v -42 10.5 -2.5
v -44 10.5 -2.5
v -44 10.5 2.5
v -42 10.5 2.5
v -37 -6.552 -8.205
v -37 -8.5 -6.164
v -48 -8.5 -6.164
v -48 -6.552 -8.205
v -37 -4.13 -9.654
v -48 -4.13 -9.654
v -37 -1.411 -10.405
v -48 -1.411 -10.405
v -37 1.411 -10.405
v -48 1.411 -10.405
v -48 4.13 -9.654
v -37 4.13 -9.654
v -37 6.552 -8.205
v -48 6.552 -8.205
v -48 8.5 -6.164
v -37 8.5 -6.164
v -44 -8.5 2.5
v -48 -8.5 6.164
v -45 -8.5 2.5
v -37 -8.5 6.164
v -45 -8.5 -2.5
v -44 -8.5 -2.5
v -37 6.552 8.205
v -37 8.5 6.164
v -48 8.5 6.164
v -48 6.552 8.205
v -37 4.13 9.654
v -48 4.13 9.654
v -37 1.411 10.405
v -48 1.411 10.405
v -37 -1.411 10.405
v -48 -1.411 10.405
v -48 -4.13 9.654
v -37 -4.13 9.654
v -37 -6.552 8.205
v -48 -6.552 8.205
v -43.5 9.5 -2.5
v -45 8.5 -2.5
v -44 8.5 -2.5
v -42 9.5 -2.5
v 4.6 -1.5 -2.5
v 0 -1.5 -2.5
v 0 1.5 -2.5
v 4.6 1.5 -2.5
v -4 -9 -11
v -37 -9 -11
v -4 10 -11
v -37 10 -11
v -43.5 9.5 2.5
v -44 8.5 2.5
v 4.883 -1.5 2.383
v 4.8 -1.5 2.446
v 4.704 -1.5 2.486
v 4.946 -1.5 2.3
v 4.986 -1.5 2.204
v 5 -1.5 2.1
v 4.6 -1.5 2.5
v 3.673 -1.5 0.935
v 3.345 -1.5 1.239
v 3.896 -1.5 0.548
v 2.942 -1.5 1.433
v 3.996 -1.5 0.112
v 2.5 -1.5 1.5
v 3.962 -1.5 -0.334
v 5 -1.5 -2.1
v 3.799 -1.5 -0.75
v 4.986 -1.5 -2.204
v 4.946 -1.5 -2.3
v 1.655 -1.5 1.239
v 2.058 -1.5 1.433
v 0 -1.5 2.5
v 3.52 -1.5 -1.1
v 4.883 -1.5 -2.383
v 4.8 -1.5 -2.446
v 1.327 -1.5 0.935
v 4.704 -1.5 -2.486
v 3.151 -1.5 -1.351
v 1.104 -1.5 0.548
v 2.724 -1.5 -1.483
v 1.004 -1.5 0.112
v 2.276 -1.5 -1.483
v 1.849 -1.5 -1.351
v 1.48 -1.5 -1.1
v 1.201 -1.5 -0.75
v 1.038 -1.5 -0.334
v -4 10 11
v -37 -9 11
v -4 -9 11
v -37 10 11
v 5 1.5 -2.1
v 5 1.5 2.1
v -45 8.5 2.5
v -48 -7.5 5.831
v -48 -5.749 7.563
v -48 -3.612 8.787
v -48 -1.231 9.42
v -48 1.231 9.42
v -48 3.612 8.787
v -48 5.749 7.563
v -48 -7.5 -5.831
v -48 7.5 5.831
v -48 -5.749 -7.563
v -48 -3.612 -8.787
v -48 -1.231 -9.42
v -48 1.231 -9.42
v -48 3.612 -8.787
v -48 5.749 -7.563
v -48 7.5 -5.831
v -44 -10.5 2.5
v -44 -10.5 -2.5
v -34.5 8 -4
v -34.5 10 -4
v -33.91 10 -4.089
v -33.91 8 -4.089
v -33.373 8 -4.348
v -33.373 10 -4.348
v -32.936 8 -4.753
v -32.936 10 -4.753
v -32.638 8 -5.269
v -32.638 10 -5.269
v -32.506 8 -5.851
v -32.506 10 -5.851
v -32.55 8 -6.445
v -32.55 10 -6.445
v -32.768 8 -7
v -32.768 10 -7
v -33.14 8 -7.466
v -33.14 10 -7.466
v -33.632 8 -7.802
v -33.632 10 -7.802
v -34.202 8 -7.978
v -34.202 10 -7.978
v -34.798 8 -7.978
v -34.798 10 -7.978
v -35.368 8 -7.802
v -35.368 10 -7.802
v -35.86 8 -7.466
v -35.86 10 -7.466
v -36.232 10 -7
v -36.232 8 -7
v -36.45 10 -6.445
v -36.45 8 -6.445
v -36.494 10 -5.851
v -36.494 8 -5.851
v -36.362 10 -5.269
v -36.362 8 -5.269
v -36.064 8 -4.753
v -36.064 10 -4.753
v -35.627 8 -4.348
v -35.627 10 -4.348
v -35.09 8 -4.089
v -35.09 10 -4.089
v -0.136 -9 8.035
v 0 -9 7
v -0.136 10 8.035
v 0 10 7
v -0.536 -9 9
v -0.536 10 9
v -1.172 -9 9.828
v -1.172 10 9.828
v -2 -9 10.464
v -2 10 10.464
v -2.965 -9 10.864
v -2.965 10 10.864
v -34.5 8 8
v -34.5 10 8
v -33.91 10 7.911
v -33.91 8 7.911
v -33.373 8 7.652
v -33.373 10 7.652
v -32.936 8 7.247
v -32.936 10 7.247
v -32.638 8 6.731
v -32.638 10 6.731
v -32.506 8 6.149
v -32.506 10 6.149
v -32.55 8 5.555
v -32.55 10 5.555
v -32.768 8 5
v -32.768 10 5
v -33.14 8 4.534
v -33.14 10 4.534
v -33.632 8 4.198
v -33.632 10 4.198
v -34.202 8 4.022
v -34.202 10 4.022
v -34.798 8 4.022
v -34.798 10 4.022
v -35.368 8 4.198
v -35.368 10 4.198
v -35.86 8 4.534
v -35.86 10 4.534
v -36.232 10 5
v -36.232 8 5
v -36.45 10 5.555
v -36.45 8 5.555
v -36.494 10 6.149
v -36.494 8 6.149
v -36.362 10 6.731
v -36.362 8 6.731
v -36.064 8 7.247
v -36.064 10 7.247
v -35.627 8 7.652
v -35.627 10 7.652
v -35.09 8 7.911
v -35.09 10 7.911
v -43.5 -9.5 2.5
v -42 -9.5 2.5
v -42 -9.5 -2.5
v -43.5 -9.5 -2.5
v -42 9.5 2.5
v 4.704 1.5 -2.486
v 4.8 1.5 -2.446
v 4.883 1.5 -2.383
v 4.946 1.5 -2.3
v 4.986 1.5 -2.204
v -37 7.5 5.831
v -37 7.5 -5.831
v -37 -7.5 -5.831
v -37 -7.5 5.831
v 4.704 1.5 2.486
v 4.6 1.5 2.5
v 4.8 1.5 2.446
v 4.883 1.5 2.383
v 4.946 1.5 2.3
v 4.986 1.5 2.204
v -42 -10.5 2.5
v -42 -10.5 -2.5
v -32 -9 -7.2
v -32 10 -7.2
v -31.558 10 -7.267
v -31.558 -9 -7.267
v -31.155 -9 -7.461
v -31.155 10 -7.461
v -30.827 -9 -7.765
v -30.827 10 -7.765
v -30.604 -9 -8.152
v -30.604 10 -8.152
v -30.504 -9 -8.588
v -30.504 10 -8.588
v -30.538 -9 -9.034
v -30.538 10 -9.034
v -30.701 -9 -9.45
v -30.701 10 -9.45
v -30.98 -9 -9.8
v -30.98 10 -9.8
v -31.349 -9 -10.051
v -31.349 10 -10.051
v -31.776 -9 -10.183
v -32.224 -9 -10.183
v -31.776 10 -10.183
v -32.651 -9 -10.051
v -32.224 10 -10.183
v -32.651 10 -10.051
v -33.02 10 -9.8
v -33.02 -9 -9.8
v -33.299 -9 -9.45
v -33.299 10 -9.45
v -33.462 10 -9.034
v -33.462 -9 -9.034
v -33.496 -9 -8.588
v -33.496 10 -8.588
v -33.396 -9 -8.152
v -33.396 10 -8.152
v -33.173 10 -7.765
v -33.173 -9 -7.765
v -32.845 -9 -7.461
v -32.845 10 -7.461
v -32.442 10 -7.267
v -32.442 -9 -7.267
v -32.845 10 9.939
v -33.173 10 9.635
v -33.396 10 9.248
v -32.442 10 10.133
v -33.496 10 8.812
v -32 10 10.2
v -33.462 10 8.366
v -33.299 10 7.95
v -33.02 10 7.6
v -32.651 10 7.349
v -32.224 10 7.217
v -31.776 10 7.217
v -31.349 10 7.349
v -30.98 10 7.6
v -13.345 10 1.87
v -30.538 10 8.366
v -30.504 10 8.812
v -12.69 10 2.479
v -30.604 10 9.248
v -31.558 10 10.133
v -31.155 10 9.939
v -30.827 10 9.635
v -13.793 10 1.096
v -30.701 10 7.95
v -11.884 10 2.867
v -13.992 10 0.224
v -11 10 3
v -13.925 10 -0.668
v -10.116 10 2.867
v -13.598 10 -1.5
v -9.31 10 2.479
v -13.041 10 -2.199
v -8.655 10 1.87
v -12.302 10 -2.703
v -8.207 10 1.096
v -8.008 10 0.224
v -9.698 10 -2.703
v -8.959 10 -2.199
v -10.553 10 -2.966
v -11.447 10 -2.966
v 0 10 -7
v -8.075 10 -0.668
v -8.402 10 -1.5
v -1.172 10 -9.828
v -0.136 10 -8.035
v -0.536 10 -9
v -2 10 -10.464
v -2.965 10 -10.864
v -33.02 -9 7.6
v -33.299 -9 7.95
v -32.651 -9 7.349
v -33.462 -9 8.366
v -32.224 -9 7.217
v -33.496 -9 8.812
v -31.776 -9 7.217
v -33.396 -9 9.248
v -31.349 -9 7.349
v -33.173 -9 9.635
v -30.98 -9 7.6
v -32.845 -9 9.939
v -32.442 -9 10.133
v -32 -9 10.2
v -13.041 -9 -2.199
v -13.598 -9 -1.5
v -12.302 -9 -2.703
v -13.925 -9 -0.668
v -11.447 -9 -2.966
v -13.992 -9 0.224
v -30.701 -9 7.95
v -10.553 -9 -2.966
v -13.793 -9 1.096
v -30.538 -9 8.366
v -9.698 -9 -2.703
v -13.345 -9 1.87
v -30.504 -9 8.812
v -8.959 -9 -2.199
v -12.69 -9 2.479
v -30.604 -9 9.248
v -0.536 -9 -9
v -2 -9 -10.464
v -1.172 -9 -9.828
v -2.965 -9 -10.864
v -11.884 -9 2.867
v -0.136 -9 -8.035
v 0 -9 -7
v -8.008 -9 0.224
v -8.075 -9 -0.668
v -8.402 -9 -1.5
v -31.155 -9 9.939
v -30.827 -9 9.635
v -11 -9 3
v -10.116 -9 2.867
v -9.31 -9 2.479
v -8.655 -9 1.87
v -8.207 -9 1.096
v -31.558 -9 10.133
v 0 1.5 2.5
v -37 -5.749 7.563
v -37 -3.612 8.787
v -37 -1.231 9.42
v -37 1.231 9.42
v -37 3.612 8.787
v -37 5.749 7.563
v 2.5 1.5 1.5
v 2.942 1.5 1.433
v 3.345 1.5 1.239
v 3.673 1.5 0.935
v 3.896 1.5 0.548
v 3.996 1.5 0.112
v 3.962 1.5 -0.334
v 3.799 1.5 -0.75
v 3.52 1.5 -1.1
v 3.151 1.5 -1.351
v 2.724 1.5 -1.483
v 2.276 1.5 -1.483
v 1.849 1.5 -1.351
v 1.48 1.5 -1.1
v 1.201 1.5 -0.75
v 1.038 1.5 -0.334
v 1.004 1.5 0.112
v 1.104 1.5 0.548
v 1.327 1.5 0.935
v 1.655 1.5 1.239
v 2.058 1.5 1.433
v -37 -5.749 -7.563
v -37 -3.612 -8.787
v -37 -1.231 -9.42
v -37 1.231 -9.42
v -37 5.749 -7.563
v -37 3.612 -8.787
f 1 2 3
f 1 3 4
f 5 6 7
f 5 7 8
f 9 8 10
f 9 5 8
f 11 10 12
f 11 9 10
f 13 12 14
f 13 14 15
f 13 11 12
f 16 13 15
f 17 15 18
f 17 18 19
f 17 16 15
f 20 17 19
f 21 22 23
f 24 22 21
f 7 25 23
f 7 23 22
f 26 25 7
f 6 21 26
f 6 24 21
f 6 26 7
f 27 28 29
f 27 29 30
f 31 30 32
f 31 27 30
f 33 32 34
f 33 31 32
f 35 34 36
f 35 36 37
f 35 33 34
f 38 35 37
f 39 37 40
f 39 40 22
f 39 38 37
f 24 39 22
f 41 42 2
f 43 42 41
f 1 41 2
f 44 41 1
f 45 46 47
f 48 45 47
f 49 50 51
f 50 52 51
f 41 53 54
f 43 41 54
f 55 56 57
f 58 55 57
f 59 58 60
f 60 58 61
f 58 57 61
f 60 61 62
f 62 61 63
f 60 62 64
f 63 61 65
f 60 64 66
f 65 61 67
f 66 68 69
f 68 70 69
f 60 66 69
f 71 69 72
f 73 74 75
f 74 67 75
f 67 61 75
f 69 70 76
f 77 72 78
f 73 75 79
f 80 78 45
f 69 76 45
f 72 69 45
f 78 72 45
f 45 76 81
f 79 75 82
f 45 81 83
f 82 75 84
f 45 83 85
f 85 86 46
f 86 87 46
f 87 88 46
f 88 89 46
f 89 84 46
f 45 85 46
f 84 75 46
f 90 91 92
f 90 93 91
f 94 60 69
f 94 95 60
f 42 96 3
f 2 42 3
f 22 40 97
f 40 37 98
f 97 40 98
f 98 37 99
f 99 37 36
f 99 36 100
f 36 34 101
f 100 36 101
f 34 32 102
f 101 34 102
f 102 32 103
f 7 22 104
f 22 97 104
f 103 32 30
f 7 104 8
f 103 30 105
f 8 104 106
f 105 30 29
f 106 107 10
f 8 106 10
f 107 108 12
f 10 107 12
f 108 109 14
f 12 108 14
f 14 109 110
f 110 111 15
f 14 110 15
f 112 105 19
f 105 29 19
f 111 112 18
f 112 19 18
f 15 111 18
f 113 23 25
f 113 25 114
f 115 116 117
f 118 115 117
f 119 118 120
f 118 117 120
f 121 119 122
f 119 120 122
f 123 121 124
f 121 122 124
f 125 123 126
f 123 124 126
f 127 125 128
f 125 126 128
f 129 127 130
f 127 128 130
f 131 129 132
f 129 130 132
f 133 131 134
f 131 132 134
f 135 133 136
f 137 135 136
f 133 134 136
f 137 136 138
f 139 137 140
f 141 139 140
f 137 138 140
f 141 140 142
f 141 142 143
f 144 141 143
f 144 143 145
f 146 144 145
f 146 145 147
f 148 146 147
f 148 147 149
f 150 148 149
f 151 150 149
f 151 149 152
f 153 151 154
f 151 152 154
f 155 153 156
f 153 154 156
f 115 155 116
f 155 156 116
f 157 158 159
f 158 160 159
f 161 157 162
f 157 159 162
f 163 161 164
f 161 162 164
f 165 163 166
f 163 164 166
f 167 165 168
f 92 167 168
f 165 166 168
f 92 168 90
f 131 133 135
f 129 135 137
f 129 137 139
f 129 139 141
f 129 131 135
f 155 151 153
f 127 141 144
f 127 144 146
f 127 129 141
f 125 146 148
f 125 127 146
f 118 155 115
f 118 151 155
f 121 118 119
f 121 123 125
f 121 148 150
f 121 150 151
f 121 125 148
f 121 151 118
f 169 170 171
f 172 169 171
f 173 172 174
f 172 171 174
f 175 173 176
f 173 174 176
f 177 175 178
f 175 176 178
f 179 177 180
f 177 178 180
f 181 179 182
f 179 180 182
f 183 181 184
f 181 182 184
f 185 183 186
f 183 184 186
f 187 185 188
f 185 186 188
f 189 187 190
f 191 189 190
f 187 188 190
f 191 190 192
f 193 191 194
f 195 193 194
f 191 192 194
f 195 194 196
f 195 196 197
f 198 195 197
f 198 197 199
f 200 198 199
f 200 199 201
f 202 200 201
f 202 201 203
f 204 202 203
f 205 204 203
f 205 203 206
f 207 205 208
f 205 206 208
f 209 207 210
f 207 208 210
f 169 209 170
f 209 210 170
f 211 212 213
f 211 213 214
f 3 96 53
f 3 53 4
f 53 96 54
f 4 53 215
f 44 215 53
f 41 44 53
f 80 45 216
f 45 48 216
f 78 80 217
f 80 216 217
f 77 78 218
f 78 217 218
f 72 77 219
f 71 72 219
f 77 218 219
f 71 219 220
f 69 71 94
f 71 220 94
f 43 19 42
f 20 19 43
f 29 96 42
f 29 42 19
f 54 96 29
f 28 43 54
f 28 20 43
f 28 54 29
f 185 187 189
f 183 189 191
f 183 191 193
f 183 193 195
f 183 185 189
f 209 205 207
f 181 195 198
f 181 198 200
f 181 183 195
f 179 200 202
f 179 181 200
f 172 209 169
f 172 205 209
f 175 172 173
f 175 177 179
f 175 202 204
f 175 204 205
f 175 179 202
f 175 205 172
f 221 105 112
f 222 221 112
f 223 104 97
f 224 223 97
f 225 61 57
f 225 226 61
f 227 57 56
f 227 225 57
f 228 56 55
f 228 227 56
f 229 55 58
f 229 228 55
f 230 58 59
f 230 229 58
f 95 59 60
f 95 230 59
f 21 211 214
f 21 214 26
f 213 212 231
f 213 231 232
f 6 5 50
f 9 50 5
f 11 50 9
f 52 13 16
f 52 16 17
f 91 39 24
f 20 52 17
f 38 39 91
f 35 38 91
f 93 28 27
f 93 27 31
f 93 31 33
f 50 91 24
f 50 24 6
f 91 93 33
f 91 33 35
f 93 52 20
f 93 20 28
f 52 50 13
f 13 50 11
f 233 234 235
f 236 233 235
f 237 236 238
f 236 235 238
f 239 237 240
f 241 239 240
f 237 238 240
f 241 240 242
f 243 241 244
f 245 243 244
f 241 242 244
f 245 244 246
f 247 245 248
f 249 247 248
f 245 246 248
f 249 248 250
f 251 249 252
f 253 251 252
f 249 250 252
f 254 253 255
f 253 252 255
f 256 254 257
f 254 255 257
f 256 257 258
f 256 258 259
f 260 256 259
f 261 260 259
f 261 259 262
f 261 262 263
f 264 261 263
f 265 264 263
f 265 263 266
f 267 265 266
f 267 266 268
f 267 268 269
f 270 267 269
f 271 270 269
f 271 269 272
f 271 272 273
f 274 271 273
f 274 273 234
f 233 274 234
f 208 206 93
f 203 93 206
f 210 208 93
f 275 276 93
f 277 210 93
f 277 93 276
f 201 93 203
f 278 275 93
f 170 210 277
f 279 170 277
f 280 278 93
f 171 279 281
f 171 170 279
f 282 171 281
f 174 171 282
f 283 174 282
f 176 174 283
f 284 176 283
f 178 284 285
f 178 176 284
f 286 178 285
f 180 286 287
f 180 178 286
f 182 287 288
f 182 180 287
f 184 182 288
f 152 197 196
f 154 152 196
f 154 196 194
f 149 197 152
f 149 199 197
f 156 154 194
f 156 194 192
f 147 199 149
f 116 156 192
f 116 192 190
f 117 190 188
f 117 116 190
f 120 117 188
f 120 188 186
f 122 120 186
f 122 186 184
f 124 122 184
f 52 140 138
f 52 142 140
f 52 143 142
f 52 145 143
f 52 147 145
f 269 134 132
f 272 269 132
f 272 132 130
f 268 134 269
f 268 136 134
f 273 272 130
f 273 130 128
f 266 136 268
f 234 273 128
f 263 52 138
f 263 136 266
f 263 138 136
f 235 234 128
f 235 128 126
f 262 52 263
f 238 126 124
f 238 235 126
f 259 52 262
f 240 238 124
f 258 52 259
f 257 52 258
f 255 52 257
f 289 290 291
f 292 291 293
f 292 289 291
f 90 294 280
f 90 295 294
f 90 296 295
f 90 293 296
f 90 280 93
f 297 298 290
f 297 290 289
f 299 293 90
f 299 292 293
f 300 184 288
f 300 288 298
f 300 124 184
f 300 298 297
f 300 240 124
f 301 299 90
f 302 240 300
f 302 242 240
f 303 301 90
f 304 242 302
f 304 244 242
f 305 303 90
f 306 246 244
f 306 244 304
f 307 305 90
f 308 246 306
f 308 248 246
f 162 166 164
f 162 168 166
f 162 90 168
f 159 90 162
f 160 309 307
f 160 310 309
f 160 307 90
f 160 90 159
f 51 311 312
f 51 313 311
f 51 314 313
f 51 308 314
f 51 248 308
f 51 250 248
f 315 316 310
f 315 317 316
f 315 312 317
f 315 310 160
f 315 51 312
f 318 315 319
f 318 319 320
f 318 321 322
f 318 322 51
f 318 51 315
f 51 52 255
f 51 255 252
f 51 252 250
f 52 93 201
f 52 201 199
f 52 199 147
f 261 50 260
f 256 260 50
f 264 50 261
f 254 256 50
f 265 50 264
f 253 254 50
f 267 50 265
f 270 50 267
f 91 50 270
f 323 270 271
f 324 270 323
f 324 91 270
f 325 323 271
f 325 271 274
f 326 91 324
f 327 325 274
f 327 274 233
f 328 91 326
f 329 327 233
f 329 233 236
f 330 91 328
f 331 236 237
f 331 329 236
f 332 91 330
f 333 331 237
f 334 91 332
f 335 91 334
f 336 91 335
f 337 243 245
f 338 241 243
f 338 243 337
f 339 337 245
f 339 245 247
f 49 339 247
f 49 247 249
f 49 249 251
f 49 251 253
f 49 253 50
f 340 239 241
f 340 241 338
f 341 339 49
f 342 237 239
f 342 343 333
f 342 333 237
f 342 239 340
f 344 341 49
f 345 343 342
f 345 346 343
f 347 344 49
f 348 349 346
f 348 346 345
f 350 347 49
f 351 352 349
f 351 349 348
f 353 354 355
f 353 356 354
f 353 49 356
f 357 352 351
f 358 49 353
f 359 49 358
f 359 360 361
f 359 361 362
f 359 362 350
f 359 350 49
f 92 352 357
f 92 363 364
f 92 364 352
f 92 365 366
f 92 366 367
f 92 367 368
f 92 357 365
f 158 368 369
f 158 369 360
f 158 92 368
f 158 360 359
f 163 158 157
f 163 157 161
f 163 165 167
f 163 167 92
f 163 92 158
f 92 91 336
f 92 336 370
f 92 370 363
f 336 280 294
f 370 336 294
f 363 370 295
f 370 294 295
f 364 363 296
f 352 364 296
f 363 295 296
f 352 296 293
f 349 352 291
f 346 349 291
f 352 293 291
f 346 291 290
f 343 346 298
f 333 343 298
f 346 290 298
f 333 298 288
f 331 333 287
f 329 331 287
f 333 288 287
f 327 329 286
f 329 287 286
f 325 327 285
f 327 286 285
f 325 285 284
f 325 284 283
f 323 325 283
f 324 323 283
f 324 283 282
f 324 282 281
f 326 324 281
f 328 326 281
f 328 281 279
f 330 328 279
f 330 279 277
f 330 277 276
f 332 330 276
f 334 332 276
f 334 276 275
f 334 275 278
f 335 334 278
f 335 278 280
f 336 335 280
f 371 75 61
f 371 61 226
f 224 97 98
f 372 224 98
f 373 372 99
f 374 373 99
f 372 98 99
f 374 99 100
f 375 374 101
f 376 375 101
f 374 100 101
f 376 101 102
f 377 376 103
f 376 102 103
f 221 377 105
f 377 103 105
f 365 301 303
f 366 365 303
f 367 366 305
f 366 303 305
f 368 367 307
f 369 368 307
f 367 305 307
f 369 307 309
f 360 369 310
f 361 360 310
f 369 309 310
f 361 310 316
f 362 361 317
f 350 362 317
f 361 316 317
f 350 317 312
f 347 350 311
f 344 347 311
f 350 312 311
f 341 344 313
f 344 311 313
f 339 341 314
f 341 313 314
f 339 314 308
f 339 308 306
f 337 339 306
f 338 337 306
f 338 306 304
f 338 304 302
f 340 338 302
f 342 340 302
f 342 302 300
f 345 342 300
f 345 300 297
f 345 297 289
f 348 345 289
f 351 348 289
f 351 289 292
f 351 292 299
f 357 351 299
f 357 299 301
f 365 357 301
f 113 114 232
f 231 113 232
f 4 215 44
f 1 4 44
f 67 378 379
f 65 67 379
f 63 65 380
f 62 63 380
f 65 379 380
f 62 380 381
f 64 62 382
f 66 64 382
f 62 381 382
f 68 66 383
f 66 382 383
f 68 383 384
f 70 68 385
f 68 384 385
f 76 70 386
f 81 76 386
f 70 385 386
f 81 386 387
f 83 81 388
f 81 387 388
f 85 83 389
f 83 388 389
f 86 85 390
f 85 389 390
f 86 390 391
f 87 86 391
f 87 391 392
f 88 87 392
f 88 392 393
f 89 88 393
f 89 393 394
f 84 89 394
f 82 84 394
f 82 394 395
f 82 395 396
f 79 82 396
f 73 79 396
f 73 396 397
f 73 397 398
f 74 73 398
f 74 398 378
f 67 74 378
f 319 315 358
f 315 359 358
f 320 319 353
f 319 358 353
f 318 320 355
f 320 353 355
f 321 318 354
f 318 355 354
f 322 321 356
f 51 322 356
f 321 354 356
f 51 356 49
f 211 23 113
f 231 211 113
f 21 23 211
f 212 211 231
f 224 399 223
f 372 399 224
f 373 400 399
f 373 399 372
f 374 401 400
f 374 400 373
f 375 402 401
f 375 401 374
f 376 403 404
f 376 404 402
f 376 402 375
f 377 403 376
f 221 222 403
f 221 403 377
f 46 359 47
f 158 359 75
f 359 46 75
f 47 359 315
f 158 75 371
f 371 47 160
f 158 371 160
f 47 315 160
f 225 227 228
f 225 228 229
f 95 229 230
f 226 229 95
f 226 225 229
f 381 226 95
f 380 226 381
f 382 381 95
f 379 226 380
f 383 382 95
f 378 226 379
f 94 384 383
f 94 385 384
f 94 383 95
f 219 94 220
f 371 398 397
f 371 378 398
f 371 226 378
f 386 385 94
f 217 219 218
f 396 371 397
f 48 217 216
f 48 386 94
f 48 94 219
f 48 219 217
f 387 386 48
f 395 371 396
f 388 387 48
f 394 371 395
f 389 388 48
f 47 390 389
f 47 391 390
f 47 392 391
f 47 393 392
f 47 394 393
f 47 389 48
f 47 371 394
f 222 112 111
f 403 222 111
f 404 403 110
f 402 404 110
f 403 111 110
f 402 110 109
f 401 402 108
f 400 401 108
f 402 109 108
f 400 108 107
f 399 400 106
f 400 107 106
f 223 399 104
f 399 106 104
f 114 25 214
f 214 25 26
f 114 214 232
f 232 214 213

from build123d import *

# Parameters (mm, degrees)
SKETCH1_W           = 37
SKETCH1_H           = 22
BOSS_EXTRUDE1_DEPTH = 10
SKETCH3_W           = 37
SKETCH3_H           = 22
BOSS_EXTRUDE2_DEPTH = 9
SKETCH5_W           = 5
SKETCH5_H           = 3
BOSS_EXTRUDE3_DEPTH = 5
SKETCH6_R           = 1.5
CUT_EXTRUDE1_DEPTH  = 5
FILLET1_R           = 0.4
FILLET2_R           = 4
SKETCH7_R           = 3
CUT_EXTRUDE2_DEPTH  = 44.023249529
SKETCH8_R           = 1.5
CUT_EXTRUDE4_DEPTH  = 44.023249529
SKETCH10_R          = 2
CUT_EXTRUDE5_DEPTH  = 2
BOSS_EXTRUDE4_DEPTH = 11
CUT_EXTRUDE6_DEPTH  = 11
SKETCH13_W          = 3
SKETCH13_H          = 5
BOSS_EXTRUDE5_DEPTH = 2
CUT_EXTRUDE7_DEPTH  = 51.955863254


with BuildPart() as part:
    # Sketch1 → Boss-Extrude1 (new body)
    with BuildSketch(Plane(origin=(0, 0, 0), x_dir=(1, 0, 0), z_dir=(0, 1, 0))):
        with Locations((-18.5, 0)):
            Rectangle(SKETCH1_W, SKETCH1_H)
    extrude(amount=BOSS_EXTRUDE1_DEPTH)

    # Sketch3 → Boss-Extrude2 (add)
    with BuildSketch(Plane.XZ):
        with Locations((-18.5, 0)):
            Rectangle(SKETCH3_W, SKETCH3_H)
    extrude(amount=BOSS_EXTRUDE2_DEPTH)

    # Sketch5 → Boss-Extrude3 (add)
    with BuildSketch(Plane(origin=(0, 0, 0), x_dir=(0, 0, -1), z_dir=(1, 0, 0))):
        Rectangle(SKETCH5_W, SKETCH5_H)
    extrude(amount=BOSS_EXTRUDE3_DEPTH)

    # Sketch6 → Cut-Extrude1 (cut)
    with BuildSketch(Plane(origin=(0, 1.5, 0), x_dir=(1, 0, 0), z_dir=(0, 1, 0))):
        with Locations(Location((2.5, 0, 0), (0, 0, 270))):
            Circle(SKETCH6_R)
    extrude(amount=-CUT_EXTRUDE1_DEPTH, mode=Mode.SUBTRACT)

    # Fillet1
    fillet1_edges = [part.edges().sort_by_distance(p)[0] for p in [
        (5, 0, -2.5),
        (5, 0, 2.5),
    ]]
    fillet(fillet1_edges, radius=FILLET1_R)

    # Fillet2
    fillet2_edges = [part.edges().sort_by_distance(p)[0] for p in [
        (0, 0.5, 11),
        (0, 0.5, -11),
    ]]
    fillet(fillet2_edges, radius=FILLET2_R)

    # Sketch7 → Cut-Extrude2 (cut, through all)
    with BuildSketch(Plane(origin=(0, 10, 0), x_dir=(1, 0, 0), z_dir=(0, 1, 0))):
        with Locations(Location((-11, 0, 0), (0, 0, 270))):
            Circle(SKETCH7_R)
    extrude(amount=-CUT_EXTRUDE2_DEPTH, mode=Mode.SUBTRACT)

    # Sketch8 → Cut-Extrude4 (cut, through all)
    with BuildSketch(Plane(origin=(0, 10, 0), x_dir=(1, 0, 0), z_dir=(0, 1, 0))):
        with Locations(Location((-32, 8.7, 0), (0, 0, 270))):
            Circle(SKETCH8_R)
        with Locations(Location((-32, -8.7, 0), (0, 0, 270))):
            Circle(SKETCH8_R)
    extrude(amount=-CUT_EXTRUDE4_DEPTH, mode=Mode.SUBTRACT)

    # Sketch10 → Cut-Extrude5 (cut)
    with BuildSketch(Plane(origin=(0, 10, 0), x_dir=(1, 0, 0), z_dir=(0, 1, 0))):
        with Locations(Location((-34.5, 6, 0), (0, 0, 270))):
            Circle(SKETCH10_R)
        with Locations(Location((-34.5, -6, 0), (0, 0, 270))):
            Circle(SKETCH10_R)
    extrude(amount=-CUT_EXTRUDE5_DEPTH, mode=Mode.SUBTRACT)

    # Sketch11 → Boss-Extrude4 (add)
    with BuildSketch(Plane.ZY.offset(37)):
        with BuildLine():
            Line((-6.164414003, 8.5), (6.164414003, 8.5))
            ThreePointArc((6.164414003, 8.5), (10.5, 0), (6.164414003, -8.5))
            Line((6.164414003, -8.5), (-6.164414003, -8.5))
            ThreePointArc((-6.164414003, -8.5), (-10.5, 0), (-6.164414003, 8.5))
        make_face()
    extrude(amount=BOSS_EXTRUDE4_DEPTH)

    # Sketch12 → Cut-Extrude6 (cut)
    with BuildSketch(Plane.ZY.offset(48)):
        with BuildLine():
            Line((-5.830951895, -7.5), (5.830951895, -7.5))
            ThreePointArc((5.830951895, -7.5), (9.5, 0), (5.830951895, 7.5))
            Line((5.830951895, 7.5), (-5.830951895, 7.5))
            ThreePointArc((-5.830951895, 7.5), (-9.5, 0), (-5.830951895, -7.5))
        make_face()
    extrude(amount=-CUT_EXTRUDE6_DEPTH, mode=Mode.SUBTRACT)

    # Sketch13 → Boss-Extrude5 (add)
    with BuildSketch(Plane(origin=(0, 8.5, 0), x_dir=(1, 0, 0), z_dir=(0, 1, 0))):
        with Locations((-43.5, 0)):
            Rectangle(SKETCH13_W, SKETCH13_H)
    boss_extrude5 = extrude(amount=BOSS_EXTRUDE5_DEPTH)

    # Sketch14 → Cut-Extrude7 (cut, through all)
    with BuildSketch(Plane.XY.offset(2.5)):
        Polygon((-44.5, 9.5), (-44, 10.5), (-45, 10.5), (-45, 9.5), align=None)
        Polygon((-45, 8.5), (-44.5, 9.5), (-45, 9.5), align=None)
        Polygon((-42, 9.5), (-43.5, 9.5), (-44, 8.5), (-42, 8.5), align=None)
    cut_extrude7 = extrude(amount=-CUT_EXTRUDE7_DEPTH, mode=Mode.SUBTRACT)

    # Mirror2: Boss-Extrude5 across plane
    add(boss_extrude5.mirror(Plane.ZX))

    # Mirror3: Cut-Extrude7 across plane
    add(cut_extrude7.mirror(Plane.ZX), mode=Mode.SUBTRACT)


solid = part.part
